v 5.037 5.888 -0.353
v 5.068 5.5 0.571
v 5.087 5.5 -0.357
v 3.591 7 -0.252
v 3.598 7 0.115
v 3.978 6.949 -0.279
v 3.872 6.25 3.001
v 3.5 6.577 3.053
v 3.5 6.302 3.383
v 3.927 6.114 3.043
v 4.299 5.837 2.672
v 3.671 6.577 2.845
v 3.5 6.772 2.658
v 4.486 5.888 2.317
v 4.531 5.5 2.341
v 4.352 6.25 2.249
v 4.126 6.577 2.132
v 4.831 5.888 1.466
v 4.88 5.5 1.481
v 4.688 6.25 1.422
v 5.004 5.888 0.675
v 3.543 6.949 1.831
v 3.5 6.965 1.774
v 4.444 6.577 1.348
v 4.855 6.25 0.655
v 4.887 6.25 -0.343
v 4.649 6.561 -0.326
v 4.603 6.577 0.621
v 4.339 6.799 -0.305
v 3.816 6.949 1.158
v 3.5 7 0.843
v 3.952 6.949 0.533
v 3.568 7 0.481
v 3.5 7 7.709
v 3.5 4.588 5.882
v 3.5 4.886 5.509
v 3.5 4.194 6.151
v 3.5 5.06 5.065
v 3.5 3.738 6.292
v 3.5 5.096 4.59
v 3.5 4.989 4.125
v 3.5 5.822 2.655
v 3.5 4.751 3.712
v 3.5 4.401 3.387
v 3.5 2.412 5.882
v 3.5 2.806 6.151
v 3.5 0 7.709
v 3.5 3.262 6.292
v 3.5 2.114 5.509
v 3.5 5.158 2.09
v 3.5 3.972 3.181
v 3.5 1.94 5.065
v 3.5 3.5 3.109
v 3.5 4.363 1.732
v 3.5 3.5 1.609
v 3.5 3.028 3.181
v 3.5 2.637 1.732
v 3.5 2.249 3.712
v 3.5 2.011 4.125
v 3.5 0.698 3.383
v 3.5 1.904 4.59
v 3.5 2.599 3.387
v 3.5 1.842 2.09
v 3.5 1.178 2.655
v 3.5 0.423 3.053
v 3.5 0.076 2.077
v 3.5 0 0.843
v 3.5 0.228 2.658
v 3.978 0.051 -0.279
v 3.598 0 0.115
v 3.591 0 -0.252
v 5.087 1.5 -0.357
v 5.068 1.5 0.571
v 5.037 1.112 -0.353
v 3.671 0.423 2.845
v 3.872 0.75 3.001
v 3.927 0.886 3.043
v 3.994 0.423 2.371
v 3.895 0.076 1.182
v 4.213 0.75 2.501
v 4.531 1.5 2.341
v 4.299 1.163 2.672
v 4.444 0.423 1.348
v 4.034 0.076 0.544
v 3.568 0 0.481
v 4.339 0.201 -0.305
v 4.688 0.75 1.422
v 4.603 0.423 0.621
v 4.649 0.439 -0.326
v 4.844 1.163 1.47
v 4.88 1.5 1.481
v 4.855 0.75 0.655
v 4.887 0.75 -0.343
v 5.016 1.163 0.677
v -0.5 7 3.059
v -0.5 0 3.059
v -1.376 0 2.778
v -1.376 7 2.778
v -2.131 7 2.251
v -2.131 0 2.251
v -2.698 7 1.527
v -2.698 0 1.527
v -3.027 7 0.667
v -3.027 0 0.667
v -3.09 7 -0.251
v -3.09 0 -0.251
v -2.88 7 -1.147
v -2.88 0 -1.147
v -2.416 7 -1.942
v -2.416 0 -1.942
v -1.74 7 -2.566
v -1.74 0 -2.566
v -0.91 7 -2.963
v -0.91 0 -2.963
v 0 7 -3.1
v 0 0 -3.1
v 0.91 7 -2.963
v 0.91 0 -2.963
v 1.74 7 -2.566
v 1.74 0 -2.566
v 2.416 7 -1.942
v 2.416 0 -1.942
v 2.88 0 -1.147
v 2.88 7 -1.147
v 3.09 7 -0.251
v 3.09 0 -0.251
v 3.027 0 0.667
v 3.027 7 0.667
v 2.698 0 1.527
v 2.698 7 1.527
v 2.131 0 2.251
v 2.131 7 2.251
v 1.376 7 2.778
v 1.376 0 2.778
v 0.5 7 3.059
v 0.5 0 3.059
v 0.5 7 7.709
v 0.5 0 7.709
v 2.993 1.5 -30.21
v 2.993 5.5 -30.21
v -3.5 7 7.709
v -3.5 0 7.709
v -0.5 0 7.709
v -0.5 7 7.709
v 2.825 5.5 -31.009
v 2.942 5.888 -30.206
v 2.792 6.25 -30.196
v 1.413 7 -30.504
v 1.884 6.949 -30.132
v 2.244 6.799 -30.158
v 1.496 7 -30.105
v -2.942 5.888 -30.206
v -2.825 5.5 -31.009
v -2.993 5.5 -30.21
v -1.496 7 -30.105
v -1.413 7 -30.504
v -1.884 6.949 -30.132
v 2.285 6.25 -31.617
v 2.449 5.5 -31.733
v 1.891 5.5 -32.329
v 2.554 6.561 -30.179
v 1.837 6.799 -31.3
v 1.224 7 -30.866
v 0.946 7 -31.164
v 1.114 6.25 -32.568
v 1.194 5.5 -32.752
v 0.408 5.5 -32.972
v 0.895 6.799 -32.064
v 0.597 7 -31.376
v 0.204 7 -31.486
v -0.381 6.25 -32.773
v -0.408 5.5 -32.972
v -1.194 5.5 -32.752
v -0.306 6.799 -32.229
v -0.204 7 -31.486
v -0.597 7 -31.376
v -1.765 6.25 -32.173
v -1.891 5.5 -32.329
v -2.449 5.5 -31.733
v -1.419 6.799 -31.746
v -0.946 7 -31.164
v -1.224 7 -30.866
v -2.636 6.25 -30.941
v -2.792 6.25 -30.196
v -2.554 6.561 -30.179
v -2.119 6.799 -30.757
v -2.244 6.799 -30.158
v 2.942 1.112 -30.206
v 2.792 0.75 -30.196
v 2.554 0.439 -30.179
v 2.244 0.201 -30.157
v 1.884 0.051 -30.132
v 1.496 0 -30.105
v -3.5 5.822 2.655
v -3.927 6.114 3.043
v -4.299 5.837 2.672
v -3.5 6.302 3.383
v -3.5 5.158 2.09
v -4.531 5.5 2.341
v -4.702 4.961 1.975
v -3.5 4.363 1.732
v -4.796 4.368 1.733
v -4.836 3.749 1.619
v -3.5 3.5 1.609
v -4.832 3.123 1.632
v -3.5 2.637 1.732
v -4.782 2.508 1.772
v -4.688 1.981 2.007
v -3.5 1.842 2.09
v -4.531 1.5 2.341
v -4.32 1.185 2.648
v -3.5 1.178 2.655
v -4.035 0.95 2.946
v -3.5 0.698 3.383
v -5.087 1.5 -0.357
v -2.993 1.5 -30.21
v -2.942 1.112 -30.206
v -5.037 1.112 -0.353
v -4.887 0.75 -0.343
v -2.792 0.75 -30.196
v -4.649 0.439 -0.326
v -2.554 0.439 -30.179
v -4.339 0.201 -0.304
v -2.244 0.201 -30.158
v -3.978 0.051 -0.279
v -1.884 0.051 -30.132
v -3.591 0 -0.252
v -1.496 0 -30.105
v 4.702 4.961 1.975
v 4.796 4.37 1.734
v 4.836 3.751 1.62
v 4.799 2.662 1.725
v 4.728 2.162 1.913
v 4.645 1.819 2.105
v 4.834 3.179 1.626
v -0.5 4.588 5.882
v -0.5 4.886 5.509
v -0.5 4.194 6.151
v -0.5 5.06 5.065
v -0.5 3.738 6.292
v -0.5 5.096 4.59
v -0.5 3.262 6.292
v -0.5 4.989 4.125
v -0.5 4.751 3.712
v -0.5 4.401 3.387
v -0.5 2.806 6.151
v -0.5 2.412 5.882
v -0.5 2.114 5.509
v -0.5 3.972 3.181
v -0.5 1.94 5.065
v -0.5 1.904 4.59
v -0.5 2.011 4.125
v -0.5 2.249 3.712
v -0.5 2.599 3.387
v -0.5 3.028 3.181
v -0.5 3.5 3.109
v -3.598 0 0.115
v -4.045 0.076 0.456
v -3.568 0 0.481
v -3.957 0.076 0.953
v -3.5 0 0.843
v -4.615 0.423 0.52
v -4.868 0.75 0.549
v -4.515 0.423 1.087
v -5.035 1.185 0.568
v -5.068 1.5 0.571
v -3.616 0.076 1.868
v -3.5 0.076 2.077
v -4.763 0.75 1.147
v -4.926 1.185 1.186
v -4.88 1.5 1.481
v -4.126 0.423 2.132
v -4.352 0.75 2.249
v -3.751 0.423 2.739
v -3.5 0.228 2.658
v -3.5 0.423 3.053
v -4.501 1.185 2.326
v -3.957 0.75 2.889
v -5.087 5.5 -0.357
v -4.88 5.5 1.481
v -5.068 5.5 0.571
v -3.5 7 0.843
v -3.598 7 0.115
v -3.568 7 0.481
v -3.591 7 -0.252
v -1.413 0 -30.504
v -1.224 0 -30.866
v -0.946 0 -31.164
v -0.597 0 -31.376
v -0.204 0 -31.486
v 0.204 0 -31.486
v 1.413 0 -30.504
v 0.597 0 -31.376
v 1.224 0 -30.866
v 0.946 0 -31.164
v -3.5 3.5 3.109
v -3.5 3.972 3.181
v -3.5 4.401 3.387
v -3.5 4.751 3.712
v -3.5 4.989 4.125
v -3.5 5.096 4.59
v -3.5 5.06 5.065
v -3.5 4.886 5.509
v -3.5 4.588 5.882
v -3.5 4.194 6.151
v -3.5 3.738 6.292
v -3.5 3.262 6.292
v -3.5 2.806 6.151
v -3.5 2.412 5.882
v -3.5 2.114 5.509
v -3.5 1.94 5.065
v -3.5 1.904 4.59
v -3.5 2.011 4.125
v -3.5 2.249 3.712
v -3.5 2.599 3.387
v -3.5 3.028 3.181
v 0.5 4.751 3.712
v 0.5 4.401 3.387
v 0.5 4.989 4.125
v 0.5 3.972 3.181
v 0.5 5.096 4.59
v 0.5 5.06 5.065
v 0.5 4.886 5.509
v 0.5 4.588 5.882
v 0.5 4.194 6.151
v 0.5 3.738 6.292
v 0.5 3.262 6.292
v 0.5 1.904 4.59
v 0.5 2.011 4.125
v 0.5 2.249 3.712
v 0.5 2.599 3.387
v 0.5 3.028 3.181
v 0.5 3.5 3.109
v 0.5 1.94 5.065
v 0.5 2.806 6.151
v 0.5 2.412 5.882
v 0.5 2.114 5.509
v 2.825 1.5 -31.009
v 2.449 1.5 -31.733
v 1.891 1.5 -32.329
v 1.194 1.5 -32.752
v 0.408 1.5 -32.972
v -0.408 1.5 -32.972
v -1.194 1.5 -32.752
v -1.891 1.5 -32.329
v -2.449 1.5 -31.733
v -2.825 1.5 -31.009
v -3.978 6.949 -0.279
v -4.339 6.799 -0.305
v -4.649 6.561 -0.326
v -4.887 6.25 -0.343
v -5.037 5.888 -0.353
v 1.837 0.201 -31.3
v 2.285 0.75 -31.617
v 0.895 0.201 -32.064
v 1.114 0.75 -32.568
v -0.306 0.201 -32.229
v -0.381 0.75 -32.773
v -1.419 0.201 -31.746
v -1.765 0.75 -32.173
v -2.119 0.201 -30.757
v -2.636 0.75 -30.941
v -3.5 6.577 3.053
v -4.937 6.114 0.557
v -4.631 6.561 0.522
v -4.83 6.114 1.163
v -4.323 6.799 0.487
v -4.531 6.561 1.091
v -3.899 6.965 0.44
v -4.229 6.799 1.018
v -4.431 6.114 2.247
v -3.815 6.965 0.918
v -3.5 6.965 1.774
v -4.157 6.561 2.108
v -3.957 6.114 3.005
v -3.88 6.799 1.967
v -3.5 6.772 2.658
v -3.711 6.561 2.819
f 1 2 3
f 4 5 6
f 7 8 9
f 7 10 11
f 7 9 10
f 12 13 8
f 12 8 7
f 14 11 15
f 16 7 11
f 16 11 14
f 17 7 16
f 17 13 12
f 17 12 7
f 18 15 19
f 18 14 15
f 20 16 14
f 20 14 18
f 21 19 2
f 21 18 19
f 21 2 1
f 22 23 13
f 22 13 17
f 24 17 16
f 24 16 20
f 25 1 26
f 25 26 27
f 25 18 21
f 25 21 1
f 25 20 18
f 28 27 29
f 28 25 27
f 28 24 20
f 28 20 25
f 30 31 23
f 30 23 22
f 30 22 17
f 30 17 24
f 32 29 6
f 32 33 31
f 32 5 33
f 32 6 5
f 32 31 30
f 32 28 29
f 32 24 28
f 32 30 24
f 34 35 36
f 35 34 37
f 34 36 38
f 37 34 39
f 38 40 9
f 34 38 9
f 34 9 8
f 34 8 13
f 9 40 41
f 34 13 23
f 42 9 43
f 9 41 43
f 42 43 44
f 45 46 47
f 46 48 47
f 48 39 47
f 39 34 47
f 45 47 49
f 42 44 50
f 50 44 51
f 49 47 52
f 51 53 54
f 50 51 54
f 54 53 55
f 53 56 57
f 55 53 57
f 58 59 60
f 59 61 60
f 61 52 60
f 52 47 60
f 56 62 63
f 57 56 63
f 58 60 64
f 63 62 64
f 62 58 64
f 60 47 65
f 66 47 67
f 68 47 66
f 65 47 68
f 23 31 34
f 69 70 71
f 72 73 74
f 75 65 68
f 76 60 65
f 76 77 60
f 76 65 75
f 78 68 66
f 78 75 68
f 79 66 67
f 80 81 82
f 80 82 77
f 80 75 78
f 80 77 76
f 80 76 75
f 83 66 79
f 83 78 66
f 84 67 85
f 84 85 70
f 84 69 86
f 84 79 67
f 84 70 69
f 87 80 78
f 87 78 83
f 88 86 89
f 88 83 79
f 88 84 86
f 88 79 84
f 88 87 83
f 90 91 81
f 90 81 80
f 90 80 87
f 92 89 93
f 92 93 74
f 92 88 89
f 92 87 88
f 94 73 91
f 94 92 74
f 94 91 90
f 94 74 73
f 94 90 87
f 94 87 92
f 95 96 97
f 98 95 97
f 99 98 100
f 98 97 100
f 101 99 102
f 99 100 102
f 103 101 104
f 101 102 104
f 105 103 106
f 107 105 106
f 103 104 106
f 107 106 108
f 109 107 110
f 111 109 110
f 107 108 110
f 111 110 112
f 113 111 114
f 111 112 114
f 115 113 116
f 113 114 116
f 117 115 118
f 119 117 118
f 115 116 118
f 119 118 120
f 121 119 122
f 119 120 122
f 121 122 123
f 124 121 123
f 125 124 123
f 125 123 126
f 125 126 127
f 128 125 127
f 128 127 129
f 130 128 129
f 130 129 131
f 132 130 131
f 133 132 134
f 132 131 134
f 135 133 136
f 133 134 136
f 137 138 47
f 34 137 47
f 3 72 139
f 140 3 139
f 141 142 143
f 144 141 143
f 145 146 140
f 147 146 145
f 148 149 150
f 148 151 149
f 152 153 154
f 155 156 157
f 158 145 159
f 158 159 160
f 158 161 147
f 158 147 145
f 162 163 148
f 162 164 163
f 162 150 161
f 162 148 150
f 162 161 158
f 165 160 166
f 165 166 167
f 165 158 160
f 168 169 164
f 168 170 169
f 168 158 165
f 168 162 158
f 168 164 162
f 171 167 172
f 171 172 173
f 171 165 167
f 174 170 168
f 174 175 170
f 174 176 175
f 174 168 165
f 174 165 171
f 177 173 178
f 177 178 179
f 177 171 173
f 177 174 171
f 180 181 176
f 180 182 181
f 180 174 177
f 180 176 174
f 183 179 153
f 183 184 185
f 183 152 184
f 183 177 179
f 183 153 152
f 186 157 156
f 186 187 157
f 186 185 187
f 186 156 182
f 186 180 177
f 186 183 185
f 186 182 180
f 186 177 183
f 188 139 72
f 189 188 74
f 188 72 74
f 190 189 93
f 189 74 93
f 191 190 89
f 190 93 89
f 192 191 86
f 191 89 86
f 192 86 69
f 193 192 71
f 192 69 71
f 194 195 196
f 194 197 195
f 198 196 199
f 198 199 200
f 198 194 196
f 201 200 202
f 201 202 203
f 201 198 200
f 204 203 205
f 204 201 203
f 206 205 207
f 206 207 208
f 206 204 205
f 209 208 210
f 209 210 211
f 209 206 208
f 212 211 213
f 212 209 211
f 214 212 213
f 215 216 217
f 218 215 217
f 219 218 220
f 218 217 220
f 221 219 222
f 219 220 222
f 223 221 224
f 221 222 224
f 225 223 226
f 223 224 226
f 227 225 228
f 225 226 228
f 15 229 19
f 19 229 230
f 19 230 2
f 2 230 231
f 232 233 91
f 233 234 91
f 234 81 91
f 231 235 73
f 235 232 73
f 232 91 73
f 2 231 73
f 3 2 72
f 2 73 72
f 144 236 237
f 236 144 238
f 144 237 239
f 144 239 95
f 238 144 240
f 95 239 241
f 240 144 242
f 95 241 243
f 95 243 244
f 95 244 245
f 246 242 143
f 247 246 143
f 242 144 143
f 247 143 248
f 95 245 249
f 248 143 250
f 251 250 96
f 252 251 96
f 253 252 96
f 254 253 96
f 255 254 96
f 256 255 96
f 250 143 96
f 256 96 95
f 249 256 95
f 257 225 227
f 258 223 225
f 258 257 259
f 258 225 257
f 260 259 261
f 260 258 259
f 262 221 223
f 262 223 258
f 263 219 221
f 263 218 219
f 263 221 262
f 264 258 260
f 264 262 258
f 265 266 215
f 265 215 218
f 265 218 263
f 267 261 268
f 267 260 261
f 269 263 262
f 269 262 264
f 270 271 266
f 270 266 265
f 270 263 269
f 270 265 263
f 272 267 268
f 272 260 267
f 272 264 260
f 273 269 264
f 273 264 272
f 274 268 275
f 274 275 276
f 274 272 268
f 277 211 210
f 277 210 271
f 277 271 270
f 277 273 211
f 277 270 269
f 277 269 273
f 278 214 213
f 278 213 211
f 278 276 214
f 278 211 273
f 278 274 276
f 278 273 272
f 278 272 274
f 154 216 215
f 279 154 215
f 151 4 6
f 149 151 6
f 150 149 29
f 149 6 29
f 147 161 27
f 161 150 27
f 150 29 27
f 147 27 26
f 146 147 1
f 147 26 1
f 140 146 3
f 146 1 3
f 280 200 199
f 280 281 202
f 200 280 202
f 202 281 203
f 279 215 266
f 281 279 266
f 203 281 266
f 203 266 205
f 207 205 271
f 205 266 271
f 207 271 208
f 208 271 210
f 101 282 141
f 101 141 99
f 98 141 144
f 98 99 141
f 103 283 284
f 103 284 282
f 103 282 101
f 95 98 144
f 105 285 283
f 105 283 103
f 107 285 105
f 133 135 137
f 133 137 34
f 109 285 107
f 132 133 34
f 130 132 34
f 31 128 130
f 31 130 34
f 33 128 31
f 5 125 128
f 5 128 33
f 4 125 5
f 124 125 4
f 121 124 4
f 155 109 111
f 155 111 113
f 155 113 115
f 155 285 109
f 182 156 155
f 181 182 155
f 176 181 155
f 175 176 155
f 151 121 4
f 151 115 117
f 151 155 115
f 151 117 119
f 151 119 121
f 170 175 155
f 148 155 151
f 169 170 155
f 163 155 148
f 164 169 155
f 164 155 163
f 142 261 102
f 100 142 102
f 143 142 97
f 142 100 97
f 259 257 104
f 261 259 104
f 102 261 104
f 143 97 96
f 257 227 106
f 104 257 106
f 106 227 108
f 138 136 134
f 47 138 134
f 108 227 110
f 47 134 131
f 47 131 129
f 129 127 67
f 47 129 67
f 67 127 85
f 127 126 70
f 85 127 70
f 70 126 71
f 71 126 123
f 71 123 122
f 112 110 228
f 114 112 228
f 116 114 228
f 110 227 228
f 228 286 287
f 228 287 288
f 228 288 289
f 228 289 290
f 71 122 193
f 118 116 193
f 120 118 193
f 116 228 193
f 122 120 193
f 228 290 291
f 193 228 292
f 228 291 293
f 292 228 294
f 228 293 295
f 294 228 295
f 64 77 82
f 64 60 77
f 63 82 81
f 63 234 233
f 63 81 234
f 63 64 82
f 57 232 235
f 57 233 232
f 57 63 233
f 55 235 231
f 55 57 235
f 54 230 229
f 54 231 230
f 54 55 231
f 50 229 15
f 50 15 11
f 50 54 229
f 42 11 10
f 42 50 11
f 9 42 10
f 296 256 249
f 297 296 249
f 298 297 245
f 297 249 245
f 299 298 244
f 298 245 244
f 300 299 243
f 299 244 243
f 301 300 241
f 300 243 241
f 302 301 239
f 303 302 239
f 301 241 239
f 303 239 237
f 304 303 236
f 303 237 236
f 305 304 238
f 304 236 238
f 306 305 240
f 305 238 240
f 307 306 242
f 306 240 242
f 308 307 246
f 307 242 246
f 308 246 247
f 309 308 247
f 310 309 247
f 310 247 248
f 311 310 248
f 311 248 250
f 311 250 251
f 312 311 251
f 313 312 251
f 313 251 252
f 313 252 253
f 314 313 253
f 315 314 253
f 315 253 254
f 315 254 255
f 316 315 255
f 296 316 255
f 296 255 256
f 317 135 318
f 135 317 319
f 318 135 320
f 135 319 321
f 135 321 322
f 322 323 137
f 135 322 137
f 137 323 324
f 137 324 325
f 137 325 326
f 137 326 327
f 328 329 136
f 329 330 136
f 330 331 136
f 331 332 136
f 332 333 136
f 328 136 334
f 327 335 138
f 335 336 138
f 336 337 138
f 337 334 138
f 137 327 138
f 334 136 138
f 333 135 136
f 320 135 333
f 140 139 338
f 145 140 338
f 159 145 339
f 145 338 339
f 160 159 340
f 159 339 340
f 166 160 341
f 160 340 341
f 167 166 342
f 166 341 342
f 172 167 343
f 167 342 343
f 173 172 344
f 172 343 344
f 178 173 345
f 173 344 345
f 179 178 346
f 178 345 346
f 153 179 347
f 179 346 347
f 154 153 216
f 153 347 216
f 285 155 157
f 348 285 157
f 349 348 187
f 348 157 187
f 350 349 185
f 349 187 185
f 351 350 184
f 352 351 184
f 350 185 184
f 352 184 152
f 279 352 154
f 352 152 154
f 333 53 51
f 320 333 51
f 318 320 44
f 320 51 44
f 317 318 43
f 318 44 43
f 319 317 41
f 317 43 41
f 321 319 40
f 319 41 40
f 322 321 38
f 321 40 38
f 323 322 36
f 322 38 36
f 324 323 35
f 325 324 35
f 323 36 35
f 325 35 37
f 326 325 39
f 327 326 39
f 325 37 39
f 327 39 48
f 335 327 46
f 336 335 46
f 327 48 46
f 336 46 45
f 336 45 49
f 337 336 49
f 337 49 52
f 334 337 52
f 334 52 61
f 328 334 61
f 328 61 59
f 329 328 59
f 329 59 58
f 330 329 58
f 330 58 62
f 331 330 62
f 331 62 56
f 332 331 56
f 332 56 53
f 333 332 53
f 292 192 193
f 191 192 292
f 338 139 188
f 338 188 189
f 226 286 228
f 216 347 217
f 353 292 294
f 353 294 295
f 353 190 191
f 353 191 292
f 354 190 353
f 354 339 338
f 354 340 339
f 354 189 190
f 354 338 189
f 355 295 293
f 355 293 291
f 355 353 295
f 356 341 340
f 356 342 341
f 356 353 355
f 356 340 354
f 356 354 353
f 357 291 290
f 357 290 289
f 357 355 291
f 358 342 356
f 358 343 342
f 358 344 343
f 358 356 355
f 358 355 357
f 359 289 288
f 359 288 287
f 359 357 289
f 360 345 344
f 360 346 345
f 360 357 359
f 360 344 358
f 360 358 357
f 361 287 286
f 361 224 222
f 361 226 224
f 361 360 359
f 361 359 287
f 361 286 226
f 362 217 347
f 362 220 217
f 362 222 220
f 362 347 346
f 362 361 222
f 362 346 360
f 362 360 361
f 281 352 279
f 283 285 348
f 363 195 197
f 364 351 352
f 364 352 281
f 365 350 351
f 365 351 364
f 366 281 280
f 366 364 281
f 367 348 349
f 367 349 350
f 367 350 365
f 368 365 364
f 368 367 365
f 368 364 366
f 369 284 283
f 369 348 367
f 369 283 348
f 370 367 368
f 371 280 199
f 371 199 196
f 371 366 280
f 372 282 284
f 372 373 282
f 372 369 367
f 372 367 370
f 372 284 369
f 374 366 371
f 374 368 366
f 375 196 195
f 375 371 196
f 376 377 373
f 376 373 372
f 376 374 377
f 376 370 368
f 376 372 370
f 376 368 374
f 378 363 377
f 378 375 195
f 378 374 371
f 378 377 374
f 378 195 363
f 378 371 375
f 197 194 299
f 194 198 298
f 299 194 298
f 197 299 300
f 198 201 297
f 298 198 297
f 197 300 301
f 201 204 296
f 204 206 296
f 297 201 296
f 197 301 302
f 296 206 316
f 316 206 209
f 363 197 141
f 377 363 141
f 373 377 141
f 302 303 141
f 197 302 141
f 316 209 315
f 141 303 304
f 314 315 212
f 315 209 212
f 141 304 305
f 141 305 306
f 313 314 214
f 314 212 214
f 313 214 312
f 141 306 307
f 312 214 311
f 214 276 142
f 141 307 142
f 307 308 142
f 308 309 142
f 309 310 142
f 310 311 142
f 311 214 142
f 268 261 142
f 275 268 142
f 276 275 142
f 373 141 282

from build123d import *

# Parameters (mm, degrees)
BOSS_EXTRUDE1_DEPTH = 7
SKETCH2_R           = 1.6
CUT_EXTRUDE1_DEPTH  = 35.813215881
SKETCH3_R           = 3.1
CUT_EXTRUDE2_DEPTH  = 35.813215926
SKETCH4_R           = 3.1
CUT_EXTRUDE3_DEPTH  = 35.813215926
FILLET1_R           = 1.5


with BuildPart() as part:
    # Sketch1 → Boss-Extrude1 (new body)
    with BuildSketch(Plane(origin=(0, 0, 0), x_dir=(1, 0, 0), z_dir=(0, 1, 0))):
        with BuildLine():
            Line((3.5, -7.709447398), (3.5, -3.709447398))
            ThreePointArc((3.5, -3.709447398), (4.75081501, -1.85465812), (5.087489656, 0.357))
            Line((5.087489656, 0.357), (2.992640974, 30.21))
            ThreePointArc((2.992640974, 30.21), (0, 33), (-2.992640974, 30.21))
            Line((-2.992640974, 30.21), (-5.087489656, 0.357))
            ThreePointArc((-5.087489656, 0.357), (-4.75081501, -1.85465812), (-3.5, -3.709447398))
            Line((-3.5, -3.709447398), (-3.5, -7.709447398))
            Line((-3.5, -7.709447398), (-0.5, -7.709447398))
            Line((-0.5, -7.709447398), (-0.5, -3.059411708))
            ThreePointArc((-0.5, -3.059411708), (0, 3.1), (0.5, -3.059411708))
            Line((0.5, -3.059411708), (0.5, -7.709447398))
            Line((0.5, -7.709447398), (3.5, -7.709447398))
        make_face()
    extrude(amount=BOSS_EXTRUDE1_DEPTH)

    # Sketch2 → Cut-Extrude1 (cut, through all)
    with BuildSketch(Plane(origin=(3.5, 0, 0), x_dir=(0, 0, -1), z_dir=(1, 0, 0))):
        with Locations((-4.709447398, 3.5)):
            Circle(SKETCH2_R)
    extrude(amount=-CUT_EXTRUDE1_DEPTH, mode=Mode.SUBTRACT)

    # Sketch3 → Cut-Extrude2 (cut, through all)
    with BuildSketch(Plane(origin=(3.5, 0, 0), x_dir=(0, 0, -1), z_dir=(1, 0, 0))):
        with Locations((-4.709447398, 3.5)):
            Circle(SKETCH3_R)
    extrude(amount=CUT_EXTRUDE2_DEPTH, mode=Mode.SUBTRACT)

    # Sketch4 → Cut-Extrude3 (cut, through all)
    with BuildSketch(Plane.ZY.offset(3.5)):
        with Locations((4.709447398, 3.5)):
            Circle(SKETCH4_R)
    extrude(amount=CUT_EXTRUDE3_DEPTH, mode=Mode.SUBTRACT)

    # Fillet1
    # the kernel refuses this fillet: 1.5 mm, written as the material it takes off along each edge
    with BuildSketch(Plane(origin=(0, 0, 0), x_dir=(-0.9975469913743412, 0, -0.06999999999999885), z_dir=(0.06999999999999885, 0, -0.9975469913743412))) as fillet1_piece_1_section:
        with BuildLine():
            CenterArc((5.1 - FILLET1_R, FILLET1_R), FILLET1_R, 270, 90)
            Line((5.1 - FILLET1_R, 0), (5.1, 0))
            Line((5.1, 0), (5.1, FILLET1_R))
        make_face()
    fillet1_piece_1 = revolve(axis=Axis((0, 0, 0), (0, 1, 0)), revolution_arc=92.812679078, mode=Mode.PRIVATE)
    fillet1_piece_1 = split(fillet1_piece_1, bisect_by=Plane(origin=(-3.5, 0.37107605, 1.567580694), z_dir=(-1, 0, 0)), keep=Keep.TOP, mode=Mode.PRIVATE)
    add(fillet1_piece_1, mode=Mode.SUBTRACT)
    with BuildSketch(Plane(origin=(0, 0, 0), x_dir=(0.020965246222385766, 0, 0.9997802050705118), z_dir=(-0.9997802050705118, 0, 0.020965246222385766))) as fillet1_piece_2_section:
        with BuildLine():
            CenterArc((5.1 - FILLET1_R, FILLET1_R), FILLET1_R, 270, 90)
            Line((5.1, FILLET1_R), (5.1, 0))
            Line((5.1, 0), (5.1 - FILLET1_R, 0))
        make_face()
    fillet1_piece_2 = revolve(axis=Axis((0, 0, 0), (0, 1, 0)), revolution_arc=92.812679078, mode=Mode.PRIVATE)
    fillet1_piece_2 = split(fillet1_piece_2, bisect_by=Plane(origin=(3.5, 0.371076241, 1.567580599), z_dir=(1, 0, 0)), keep=Keep.TOP, mode=Mode.PRIVATE)
    add(fillet1_piece_2, mode=Mode.SUBTRACT)
    with BuildSketch(Plane(origin=(5.087489656, 0, -0.357), x_dir=(0, 1, 0), z_dir=(-0.06999999999999998, 0, -0.9975469913743412)), Plane(origin=(-2.992640974, 0, -30.21), x_dir=(0, 1, 0), z_dir=(-0.06999999999999998, 0, 0.9975469913743412)), Plane(origin=(-2.992640974, 7, -30.21), x_dir=(0.9975469913743412, 0, 0.06999999999999998), z_dir=(-0.06999999999999998, 0, 0.9975469913743412))) as fillet1_piece_3:
        with BuildLine():
            CenterArc((FILLET1_R, -FILLET1_R), FILLET1_R, 90, 90)
            Line((0, -FILLET1_R), (0, 0))
            Line((0, 0), (FILLET1_R, 0))
        make_face()
    extrude(amount=29.926409741, mode=Mode.SUBTRACT)
    with BuildSketch(Plane(origin=(0, 0, -30), x_dir=(0.9975469913743412, 0, -0.07000000000000023), z_dir=(0.07000000000000023, 0, 0.9975469913743412))) as fillet1_piece_4:
        with BuildLine():
            CenterArc((3 - FILLET1_R, FILLET1_R), FILLET1_R, 270, 90)
            Line((3, FILLET1_R), (3, 0))
            Line((3, 0), (3 - FILLET1_R, 0))
        make_face()
    revolve(axis=Axis((0, 0, -30), (0, 1, 0)), revolution_arc=171.972025564, mode=Mode.SUBTRACT)
    with BuildSketch(Plane(origin=(0, 7, 0), x_dir=(-0.9975469913743412, 0, -0.06999999999999885), z_dir=(0.06999999999999885, 0, -0.9975469913743412))) as fillet1_piece_5_section:
        with BuildLine():
            CenterArc((5.1 - FILLET1_R, -FILLET1_R), FILLET1_R, 0, 90)
            Line((5.1, -FILLET1_R), (5.1, 0))
            Line((5.1, 0), (5.1 - FILLET1_R, 0))
        make_face()
    fillet1_piece_5 = revolve(axis=Axis((0, 7, 0), (0, 1, 0)), revolution_arc=92.812679078, mode=Mode.PRIVATE)
    fillet1_piece_5 = split(fillet1_piece_5, bisect_by=Plane(origin=(-3.5, 6.628923944, 1.567580643), z_dir=(-1, 0, 0)), keep=Keep.TOP, mode=Mode.PRIVATE)
    add(fillet1_piece_5, mode=Mode.SUBTRACT)
    with BuildSketch(Plane(origin=(0, 7, 0), x_dir=(0.020965246222385686, 0, 0.9997802050705119), z_dir=(-0.9997802050705119, 0, 0.020965246222385686))) as fillet1_piece_6_section:
        with BuildLine():
            CenterArc((5.1 - FILLET1_R, -FILLET1_R), FILLET1_R, 0, 90)
            Line((5.1, -FILLET1_R), (5.1, 0))
            Line((5.1, 0), (5.1 - FILLET1_R, 0))
        make_face()
    fillet1_piece_6 = revolve(axis=Axis((0, 7, 0), (0, 1, 0)), revolution_arc=92.812679078, mode=Mode.PRIVATE)
    fillet1_piece_6 = split(fillet1_piece_6, bisect_by=Plane(origin=(3.5, 6.628923759, 1.567580599), z_dir=(1, 0, 0)), keep=Keep.TOP, mode=Mode.PRIVATE)
    add(fillet1_piece_6, mode=Mode.SUBTRACT)
    with BuildSketch(Plane(origin=(0, 7, -30), x_dir=(0.9975469913743412, 0, -0.07000000000000023), z_dir=(0.07000000000000023, 0, 0.9975469913743412))) as fillet1_piece_7:
        with BuildLine():
            CenterArc((3 - FILLET1_R, -FILLET1_R), FILLET1_R, 0, 90)
            Line((3, -FILLET1_R), (3, 0))
            Line((3, 0), (3 - FILLET1_R, 0))
        make_face()
    revolve(axis=Axis((0, 7, -30), (0, 1, 0)), revolution_arc=171.972025564, mode=Mode.SUBTRACT)
    with BuildSketch(Plane(origin=(5.087489656, 7, -0.357), x_dir=(0, -1, 0), z_dir=(-0.06999999999999998, 0, -0.9975469913743412))) as fillet1_piece_8:
        with BuildLine():
            CenterArc((FILLET1_R, FILLET1_R), FILLET1_R, 180, 90)
            Line((0, FILLET1_R), (0, 0))
            Line((0, 0), (FILLET1_R, 0))
        make_face()
    extrude(amount=29.926409741, mode=Mode.SUBTRACT)


solid = part.part
